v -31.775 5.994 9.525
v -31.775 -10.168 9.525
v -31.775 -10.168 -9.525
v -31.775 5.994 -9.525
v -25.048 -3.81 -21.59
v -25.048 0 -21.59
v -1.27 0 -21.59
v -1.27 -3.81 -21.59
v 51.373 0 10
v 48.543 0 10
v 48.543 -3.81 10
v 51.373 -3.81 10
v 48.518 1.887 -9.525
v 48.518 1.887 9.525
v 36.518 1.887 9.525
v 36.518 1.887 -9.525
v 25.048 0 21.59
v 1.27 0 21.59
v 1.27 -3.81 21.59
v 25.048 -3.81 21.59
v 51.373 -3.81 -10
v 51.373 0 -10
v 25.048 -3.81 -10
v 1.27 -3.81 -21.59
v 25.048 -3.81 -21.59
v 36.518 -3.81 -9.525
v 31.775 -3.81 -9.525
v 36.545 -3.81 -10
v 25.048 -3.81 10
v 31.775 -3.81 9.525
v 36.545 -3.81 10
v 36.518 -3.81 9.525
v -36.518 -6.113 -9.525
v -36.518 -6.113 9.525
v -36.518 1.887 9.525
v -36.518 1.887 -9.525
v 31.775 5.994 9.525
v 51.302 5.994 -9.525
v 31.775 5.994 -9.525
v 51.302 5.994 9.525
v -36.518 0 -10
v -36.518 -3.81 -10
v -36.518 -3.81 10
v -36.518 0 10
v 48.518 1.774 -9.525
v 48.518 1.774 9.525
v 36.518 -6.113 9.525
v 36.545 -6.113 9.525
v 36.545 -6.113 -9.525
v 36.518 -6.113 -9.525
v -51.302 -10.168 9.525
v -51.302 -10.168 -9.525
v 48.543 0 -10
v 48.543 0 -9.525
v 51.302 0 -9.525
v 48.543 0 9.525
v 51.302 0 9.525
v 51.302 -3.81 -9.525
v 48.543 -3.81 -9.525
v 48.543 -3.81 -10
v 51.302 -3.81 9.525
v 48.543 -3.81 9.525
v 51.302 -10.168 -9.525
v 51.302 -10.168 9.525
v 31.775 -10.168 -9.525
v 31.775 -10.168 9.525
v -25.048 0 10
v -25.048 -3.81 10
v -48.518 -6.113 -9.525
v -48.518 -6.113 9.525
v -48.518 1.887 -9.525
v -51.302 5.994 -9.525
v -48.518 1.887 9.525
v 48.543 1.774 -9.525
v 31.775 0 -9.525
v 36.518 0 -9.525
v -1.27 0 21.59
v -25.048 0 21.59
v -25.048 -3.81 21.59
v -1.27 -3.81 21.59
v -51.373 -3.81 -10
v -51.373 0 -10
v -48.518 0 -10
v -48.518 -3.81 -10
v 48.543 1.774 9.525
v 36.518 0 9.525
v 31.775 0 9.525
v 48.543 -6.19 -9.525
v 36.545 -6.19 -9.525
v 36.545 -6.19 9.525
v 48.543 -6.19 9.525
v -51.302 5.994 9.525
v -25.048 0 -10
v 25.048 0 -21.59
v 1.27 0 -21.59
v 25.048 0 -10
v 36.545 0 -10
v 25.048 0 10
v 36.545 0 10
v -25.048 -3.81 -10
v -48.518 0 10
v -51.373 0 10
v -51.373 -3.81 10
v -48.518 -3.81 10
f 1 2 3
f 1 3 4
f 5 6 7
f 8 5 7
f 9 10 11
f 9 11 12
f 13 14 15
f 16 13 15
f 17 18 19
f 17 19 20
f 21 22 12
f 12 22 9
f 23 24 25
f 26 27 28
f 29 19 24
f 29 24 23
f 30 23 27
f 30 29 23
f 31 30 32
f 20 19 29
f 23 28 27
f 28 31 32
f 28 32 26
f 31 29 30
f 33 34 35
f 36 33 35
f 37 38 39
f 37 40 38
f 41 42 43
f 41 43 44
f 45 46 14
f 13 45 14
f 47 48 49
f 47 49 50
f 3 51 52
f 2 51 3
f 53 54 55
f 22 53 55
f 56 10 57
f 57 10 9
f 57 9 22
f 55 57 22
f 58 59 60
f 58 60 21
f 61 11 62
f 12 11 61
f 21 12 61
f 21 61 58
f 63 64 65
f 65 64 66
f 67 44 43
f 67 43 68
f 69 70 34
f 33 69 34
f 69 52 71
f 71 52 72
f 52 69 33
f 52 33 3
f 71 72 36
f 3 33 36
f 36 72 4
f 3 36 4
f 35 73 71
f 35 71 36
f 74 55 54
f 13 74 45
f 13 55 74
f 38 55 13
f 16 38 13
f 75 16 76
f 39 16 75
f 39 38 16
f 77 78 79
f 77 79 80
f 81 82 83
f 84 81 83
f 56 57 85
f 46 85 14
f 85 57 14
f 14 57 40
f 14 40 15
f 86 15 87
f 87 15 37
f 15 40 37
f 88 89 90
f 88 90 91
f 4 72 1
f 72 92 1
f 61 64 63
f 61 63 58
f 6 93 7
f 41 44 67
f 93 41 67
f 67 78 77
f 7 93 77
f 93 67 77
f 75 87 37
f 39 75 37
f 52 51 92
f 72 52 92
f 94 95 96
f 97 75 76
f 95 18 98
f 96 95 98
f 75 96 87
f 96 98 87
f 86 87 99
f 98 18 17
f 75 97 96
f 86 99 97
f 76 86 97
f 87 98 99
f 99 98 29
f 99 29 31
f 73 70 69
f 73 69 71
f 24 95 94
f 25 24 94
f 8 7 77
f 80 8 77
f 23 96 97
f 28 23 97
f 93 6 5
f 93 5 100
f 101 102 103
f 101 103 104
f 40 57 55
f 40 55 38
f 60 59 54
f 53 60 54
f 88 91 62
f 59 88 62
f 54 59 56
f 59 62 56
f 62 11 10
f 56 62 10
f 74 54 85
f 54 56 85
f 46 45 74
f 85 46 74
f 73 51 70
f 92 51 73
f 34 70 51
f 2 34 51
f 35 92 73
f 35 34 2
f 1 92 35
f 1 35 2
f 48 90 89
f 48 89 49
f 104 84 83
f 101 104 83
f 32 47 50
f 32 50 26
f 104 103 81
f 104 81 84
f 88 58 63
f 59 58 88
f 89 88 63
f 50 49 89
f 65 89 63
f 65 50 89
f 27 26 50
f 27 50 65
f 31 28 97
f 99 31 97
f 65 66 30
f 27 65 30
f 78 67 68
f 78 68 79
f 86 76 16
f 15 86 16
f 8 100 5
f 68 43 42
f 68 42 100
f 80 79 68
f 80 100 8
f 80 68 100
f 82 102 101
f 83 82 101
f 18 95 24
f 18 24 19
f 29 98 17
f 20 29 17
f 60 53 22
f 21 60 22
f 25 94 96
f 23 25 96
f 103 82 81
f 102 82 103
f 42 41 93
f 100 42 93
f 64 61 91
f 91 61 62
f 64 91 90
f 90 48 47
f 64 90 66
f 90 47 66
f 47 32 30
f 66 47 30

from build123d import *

# Parameters (mm, degrees)
F0_W      = 50.0962749696
F0_H      = 43.18
F2_DEPTH  = 3.81
F1_W      = 102.7450922131
F1_H      = 20
F3_DEPTH  = 3.81
F5_W      = 2.54
F5_H      = 43.18
F6_DEPTH  = 3.81
F7_W      = 19.5271223783
F7_H      = 16.1628960632
F8_DEPTH  = 9.525
F4_W      = 12
F4_H      = 8
F9_DEPTH  = 25.4
F11_W     = 11.9977556169
F11_H     = 7.9640262993
F12_DEPTH = 25.4


with BuildPart() as f2:
    # F0 (on Front) → F2 (new body)
    with BuildSketch(Plane.XZ):
        Rectangle(F0_W, F0_H)
    extrude(amount=F2_DEPTH)

    # F1 (on Front) → F3 (join)
    with BuildSketch(Plane.XZ):
        Rectangle(F1_W, F1_H)
    extrude(amount=F3_DEPTH)

    # F5 (on Front) → F6 (cut)
    with BuildSketch(Plane.XZ):
        Rectangle(F5_W, F5_H)
    extrude(amount=F6_DEPTH, mode=Mode.SUBTRACT)


with BuildPart() as f8:
    # F7 (on Top) → F8 (new body, symmetric)
    with BuildSketch(Plane.XY):
        with Locations((-41.53829813, -2.0870047156)):
            Rectangle(F7_W, F7_H)
    extrude(amount=F8_DEPTH, both=True)


with BuildPart() as f9_tool:
    # F4 (on Top) → F9 (new body, symmetric)
    with BuildSketch(Plane.XY):
        with Locations((-42.5182890683, -2.1125821513)):
            Rectangle(F4_W, F4_H)
    extrude(amount=F9_DEPTH, both=True)


with BuildPart() as f2_1:
    add(f2.part)

    # F9: cut by f9_tool
    add(f9_tool.part, mode=Mode.SUBTRACT)

    # F10: F8 across plane


with BuildPart() as f8_1:
    add(f8.part)

    # F9: cut by f9_tool
    add(f9_tool.part, mode=Mode.SUBTRACT)


with BuildPart() as f2_2:
    add(f2_1.part)
    add(f8_1.part.mirror(Plane.YZ))

    # F11 (on Top) → F12 (cut, symmetric)
    with BuildSketch(Plane.XY):
        with Locations((42.5440985709, -2.2076470195)):
            Rectangle(F11_W, F11_H)
    extrude(amount=F12_DEPTH, both=True, mode=Mode.SUBTRACT)


solid = Compound([f8_1.part, f2_2.part])
